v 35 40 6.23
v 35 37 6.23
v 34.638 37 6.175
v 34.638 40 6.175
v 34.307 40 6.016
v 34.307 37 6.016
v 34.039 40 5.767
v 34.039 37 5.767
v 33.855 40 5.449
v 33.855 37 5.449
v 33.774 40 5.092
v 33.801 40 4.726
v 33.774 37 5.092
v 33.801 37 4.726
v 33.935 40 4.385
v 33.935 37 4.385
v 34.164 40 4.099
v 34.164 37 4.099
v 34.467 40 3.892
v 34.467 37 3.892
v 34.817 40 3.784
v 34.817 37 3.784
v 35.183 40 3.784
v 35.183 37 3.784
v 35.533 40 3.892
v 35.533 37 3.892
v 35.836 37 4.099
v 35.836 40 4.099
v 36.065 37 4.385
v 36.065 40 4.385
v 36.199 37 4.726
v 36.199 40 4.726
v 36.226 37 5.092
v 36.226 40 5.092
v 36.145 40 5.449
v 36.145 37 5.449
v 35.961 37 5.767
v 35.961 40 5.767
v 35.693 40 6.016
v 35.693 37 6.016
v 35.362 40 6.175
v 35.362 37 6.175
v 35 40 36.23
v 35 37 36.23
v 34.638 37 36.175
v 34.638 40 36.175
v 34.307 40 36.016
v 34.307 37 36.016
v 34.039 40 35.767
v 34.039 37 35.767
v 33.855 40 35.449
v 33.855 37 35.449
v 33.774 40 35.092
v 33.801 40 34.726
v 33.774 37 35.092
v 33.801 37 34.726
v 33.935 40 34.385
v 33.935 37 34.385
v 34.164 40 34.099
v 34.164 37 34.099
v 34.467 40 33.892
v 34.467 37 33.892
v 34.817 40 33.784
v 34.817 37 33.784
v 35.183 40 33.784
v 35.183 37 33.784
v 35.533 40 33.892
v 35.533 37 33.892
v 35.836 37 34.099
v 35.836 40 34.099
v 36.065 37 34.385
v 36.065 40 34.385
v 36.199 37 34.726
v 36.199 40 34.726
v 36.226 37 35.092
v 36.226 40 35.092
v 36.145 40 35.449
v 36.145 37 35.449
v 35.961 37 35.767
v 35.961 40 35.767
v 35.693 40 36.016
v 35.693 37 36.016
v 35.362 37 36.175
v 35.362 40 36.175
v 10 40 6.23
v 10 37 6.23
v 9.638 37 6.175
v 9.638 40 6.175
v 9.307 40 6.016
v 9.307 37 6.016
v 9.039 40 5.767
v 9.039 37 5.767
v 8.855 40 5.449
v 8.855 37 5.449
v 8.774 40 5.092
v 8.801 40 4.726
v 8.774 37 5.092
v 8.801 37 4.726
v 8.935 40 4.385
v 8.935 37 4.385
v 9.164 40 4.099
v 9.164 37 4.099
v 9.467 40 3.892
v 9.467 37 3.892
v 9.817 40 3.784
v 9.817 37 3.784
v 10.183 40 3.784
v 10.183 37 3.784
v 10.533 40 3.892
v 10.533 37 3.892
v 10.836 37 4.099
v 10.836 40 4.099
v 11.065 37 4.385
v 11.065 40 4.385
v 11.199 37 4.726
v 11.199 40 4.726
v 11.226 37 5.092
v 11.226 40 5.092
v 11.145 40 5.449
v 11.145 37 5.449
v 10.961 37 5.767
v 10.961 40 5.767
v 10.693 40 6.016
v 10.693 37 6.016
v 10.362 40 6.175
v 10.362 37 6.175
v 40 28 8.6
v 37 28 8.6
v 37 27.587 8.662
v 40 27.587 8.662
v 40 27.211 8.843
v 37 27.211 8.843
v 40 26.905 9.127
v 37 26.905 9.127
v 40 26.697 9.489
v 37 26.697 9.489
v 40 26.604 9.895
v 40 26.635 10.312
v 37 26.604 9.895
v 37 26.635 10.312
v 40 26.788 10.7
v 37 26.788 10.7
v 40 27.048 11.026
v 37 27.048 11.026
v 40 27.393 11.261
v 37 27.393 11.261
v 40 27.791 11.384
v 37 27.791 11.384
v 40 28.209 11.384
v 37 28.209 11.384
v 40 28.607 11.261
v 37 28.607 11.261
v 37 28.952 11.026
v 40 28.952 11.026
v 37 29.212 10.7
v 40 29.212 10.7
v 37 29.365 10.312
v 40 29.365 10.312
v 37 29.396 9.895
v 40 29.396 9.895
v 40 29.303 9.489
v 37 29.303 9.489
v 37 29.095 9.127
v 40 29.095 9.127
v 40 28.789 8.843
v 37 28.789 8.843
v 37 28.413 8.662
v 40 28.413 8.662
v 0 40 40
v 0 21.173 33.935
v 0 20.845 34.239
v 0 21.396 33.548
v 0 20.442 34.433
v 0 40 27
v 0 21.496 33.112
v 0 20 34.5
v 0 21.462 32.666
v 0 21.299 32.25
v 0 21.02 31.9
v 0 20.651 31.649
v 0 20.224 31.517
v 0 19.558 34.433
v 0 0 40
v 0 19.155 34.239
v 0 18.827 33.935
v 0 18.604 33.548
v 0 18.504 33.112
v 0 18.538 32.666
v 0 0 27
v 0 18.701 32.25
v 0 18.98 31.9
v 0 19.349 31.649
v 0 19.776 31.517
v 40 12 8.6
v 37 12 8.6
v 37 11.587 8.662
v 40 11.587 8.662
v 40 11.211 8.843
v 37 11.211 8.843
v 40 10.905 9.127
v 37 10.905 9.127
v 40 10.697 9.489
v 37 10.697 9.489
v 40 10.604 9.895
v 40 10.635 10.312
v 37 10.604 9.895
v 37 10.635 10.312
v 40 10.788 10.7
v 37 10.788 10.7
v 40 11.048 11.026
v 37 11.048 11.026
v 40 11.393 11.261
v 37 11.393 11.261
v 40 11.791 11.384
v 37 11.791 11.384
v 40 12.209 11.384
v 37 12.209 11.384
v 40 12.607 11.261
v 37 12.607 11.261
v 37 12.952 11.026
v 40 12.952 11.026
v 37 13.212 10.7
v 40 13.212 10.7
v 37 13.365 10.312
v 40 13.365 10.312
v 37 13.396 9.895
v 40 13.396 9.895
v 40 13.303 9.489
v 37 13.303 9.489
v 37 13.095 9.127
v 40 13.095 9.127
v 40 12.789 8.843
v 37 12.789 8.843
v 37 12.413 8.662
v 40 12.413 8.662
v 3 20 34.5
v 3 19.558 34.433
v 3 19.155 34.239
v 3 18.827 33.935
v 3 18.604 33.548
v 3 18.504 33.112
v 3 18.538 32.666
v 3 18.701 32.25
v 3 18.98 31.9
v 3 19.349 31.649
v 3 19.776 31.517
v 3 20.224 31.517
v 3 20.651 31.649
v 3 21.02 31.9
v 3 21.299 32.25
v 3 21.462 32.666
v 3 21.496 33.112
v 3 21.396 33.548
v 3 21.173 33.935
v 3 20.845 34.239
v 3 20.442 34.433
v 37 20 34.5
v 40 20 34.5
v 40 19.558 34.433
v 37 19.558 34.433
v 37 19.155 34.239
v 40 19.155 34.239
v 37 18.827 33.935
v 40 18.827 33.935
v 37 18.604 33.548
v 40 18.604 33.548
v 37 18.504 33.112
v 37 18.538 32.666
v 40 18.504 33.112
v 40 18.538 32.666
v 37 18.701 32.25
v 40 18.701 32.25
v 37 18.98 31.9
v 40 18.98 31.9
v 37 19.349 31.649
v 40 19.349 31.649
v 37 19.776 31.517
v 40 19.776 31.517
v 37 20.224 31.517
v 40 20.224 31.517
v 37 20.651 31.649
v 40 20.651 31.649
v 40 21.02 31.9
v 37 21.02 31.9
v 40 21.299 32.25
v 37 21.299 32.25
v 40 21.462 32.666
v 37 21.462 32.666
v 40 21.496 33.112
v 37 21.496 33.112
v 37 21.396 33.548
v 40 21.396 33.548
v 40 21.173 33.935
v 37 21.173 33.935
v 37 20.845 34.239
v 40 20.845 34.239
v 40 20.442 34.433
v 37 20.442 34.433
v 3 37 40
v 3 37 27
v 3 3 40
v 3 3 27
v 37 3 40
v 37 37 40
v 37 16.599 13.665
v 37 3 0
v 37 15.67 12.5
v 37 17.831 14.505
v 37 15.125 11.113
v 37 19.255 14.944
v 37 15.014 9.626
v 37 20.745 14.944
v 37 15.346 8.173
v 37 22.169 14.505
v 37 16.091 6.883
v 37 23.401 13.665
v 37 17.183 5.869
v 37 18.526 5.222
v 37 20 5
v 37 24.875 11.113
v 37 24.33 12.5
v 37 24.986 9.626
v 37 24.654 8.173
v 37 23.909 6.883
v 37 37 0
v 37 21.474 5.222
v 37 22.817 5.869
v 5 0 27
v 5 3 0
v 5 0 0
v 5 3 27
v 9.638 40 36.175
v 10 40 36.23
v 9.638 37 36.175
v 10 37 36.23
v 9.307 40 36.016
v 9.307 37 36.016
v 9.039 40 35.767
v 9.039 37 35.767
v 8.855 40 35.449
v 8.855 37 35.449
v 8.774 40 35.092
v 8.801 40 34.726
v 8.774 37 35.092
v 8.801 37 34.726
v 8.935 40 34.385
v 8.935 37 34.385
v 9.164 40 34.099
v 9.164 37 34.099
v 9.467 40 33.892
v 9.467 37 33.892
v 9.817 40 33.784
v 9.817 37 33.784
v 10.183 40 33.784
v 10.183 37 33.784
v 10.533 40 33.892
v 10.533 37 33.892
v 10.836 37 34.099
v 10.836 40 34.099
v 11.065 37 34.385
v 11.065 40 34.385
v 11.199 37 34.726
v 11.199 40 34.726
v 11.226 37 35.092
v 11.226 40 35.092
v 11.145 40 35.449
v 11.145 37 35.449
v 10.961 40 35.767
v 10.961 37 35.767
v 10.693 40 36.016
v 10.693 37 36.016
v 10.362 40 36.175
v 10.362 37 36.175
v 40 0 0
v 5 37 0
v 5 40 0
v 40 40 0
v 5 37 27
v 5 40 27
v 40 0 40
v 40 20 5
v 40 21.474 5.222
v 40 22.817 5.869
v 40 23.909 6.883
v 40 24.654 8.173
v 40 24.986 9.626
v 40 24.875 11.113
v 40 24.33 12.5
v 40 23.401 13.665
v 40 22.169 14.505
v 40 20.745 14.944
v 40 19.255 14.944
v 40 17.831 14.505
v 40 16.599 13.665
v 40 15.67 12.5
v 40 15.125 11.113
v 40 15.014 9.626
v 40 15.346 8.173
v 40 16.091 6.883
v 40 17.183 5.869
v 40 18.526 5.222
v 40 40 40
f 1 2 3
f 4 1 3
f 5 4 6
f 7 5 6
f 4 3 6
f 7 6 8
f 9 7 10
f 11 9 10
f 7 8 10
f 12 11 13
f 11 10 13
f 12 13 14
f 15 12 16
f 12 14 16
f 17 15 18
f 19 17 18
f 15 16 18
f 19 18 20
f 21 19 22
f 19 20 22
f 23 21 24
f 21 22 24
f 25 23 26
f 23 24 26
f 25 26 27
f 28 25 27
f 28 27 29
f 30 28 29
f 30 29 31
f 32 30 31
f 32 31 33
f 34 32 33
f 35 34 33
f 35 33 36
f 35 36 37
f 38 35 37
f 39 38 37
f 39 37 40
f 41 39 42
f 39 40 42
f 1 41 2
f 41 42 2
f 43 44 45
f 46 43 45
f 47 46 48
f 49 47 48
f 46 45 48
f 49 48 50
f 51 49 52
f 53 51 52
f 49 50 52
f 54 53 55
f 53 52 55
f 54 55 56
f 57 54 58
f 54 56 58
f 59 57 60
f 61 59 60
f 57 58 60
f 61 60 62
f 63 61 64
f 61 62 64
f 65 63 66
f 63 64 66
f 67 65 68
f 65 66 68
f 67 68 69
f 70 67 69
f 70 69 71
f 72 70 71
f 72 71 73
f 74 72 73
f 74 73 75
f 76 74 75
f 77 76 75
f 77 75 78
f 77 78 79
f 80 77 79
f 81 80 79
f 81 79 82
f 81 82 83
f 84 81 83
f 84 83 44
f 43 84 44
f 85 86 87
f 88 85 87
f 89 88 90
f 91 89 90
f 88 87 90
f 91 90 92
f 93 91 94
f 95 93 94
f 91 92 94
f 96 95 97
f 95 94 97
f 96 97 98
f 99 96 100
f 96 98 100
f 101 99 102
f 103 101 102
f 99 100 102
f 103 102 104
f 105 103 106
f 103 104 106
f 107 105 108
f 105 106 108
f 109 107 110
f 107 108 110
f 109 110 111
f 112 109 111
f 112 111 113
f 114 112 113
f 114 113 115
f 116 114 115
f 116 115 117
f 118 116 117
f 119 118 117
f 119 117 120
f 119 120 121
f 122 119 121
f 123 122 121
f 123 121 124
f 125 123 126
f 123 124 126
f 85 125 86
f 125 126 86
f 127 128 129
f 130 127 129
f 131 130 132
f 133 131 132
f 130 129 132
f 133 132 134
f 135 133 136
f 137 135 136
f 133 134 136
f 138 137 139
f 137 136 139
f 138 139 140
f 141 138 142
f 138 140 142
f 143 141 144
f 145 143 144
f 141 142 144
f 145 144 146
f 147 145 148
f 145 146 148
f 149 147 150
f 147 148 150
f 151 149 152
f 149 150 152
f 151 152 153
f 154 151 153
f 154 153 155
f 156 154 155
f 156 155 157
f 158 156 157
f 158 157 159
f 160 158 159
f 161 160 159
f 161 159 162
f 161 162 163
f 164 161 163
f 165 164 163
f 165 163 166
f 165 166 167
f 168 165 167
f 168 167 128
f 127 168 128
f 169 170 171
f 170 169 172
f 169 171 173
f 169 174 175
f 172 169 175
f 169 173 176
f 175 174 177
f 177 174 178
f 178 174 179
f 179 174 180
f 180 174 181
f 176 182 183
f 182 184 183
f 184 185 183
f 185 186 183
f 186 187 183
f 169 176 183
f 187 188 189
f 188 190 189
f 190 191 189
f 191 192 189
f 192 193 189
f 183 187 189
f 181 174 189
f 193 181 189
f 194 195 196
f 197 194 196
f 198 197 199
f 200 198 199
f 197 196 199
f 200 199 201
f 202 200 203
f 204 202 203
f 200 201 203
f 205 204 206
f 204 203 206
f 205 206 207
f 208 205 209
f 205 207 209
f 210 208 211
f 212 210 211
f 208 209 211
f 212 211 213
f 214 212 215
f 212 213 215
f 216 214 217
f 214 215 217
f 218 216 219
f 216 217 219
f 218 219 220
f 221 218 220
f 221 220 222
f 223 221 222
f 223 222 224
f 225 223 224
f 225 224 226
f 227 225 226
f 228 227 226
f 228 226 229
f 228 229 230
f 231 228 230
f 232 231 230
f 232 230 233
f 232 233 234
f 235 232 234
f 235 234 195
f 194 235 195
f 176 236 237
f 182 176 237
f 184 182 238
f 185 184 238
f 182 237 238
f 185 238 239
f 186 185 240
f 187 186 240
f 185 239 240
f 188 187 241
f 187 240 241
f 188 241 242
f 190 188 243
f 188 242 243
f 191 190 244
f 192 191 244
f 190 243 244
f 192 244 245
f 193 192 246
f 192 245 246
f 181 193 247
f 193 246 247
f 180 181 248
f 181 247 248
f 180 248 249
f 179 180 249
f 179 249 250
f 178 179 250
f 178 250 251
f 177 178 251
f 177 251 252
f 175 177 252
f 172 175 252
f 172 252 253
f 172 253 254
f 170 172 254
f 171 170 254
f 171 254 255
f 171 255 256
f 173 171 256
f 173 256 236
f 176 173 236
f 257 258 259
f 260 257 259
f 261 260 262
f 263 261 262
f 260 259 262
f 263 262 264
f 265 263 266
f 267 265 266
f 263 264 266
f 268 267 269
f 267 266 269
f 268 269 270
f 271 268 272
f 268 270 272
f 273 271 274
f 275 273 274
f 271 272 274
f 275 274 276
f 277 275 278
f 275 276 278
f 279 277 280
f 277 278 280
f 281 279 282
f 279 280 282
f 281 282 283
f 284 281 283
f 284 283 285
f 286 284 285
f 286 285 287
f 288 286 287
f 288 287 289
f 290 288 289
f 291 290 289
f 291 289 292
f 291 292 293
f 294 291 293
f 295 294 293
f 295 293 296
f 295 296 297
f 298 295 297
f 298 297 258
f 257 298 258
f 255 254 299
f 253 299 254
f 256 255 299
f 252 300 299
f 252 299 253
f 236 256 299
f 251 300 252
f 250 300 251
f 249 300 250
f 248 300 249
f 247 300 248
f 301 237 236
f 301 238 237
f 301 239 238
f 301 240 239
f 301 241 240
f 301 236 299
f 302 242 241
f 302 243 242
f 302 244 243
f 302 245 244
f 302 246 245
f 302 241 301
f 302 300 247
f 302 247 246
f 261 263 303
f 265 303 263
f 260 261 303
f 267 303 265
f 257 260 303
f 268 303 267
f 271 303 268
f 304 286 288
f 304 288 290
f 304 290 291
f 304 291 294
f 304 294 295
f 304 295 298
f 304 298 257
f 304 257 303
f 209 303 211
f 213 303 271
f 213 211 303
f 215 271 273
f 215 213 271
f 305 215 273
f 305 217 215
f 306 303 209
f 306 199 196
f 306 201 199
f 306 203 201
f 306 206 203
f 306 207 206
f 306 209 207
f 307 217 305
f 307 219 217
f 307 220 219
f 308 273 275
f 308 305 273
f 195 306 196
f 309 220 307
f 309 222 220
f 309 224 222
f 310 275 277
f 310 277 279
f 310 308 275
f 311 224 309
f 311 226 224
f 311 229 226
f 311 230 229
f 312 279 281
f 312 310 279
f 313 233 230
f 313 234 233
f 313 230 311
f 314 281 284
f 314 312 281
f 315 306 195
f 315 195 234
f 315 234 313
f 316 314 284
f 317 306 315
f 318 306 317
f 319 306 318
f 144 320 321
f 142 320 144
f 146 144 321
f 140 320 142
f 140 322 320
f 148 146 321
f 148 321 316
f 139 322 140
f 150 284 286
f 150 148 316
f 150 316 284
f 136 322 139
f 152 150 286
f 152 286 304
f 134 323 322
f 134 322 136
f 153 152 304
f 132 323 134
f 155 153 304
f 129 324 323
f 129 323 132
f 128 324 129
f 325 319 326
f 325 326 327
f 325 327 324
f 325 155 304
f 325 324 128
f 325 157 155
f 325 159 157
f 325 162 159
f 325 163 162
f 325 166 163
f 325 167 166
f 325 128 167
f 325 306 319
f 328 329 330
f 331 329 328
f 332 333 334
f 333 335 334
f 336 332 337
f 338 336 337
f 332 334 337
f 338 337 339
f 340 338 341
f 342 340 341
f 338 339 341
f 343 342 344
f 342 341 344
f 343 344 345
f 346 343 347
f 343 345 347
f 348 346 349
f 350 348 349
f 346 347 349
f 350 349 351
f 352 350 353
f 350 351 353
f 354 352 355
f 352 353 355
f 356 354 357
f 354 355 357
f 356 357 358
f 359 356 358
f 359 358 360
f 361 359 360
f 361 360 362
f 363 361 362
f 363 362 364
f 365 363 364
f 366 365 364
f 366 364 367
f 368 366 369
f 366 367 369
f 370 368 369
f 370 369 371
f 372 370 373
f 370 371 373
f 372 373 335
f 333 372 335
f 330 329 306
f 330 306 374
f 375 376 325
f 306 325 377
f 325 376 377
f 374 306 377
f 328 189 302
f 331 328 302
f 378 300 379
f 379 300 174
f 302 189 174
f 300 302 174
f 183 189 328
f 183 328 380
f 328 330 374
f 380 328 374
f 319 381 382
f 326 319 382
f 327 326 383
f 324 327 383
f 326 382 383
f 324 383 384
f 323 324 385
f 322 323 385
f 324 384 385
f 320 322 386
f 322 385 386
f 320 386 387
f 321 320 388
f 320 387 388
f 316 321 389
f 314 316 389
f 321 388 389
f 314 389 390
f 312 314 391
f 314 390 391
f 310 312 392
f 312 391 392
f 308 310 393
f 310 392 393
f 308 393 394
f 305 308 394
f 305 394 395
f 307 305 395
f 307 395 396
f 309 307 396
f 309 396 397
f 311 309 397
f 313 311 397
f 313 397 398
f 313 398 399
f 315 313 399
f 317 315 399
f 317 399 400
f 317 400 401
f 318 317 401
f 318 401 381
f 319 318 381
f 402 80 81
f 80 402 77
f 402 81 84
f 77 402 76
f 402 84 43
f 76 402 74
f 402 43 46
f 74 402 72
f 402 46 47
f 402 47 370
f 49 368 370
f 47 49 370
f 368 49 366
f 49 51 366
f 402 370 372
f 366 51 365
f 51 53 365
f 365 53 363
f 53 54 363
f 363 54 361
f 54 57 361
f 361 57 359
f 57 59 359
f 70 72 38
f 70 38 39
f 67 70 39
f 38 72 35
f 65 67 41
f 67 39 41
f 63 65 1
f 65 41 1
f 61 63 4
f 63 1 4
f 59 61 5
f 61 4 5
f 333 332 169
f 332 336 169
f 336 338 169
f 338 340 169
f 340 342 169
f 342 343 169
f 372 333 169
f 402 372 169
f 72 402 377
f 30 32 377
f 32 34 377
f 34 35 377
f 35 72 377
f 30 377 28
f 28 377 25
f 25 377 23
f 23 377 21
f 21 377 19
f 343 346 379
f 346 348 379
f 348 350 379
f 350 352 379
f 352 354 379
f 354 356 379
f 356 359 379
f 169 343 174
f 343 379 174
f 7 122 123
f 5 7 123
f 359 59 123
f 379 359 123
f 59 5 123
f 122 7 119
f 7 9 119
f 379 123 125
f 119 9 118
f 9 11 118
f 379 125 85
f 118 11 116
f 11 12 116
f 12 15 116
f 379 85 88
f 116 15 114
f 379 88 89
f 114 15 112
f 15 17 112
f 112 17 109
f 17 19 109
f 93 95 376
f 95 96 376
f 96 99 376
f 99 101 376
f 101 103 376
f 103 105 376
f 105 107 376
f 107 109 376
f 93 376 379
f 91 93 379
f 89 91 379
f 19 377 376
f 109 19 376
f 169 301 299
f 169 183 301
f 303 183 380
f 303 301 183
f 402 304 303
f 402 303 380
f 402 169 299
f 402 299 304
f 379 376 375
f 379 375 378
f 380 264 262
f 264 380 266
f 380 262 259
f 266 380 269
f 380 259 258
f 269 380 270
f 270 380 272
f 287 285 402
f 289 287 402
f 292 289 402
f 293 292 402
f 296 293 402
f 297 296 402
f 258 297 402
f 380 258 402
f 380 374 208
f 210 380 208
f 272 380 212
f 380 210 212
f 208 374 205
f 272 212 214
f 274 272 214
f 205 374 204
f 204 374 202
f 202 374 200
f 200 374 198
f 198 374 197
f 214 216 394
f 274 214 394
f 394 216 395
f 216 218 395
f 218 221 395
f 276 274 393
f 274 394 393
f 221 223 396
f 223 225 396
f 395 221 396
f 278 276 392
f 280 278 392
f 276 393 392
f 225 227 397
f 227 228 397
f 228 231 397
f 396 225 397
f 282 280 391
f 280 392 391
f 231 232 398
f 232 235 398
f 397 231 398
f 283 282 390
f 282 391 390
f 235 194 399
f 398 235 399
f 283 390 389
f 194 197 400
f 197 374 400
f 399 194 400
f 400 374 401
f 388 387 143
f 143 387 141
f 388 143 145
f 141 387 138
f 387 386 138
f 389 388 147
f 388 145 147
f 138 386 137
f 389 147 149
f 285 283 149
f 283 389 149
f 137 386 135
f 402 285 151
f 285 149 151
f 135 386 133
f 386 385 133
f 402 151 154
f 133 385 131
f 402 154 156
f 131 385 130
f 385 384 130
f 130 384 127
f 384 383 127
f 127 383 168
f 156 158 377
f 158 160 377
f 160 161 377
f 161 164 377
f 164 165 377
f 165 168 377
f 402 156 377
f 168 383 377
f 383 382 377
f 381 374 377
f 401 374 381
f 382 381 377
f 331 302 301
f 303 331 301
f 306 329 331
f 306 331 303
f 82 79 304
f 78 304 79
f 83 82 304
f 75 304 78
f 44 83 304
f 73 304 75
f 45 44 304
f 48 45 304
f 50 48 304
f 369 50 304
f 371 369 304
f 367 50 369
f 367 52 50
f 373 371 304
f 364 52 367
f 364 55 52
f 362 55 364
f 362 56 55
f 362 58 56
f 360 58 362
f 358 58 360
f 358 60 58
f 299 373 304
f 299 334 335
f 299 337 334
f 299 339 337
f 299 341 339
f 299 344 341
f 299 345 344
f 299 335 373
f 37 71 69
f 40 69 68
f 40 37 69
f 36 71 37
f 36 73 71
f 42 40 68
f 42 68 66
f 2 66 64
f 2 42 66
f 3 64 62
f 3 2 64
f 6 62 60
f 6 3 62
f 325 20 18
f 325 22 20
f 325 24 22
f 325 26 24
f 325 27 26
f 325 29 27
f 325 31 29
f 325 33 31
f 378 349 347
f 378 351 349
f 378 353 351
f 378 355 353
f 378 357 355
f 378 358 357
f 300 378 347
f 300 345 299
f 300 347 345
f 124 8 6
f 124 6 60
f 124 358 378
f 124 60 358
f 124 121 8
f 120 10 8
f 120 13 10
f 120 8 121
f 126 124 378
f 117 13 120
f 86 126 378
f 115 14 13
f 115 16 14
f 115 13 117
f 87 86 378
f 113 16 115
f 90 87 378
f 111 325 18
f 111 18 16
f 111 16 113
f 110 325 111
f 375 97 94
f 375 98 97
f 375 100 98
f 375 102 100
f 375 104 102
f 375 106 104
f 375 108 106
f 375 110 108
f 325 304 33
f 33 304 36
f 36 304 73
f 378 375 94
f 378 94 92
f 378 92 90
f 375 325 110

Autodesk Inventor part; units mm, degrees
ref_plane "YZ Plane" through (0, 0, 0) normal (1, 0, 0) x (0, 1, 0)
ref_plane "XZ Plane" through (0, 0, 0) normal (0, 1, 0) x (-1, 0, 0)
ref_plane "XY Plane" through (0, 0, 0) normal (0, 0, 1) x (1, 0, 0)
sketch "スケッチ1" plane through (0, 0, 0) normal (0, 0, 1) x (1, 0, 0)
  line L0 (0, 0) -> (40, 0)
  line L1 (40, 0) -> (40, 40)
  line L2 (40, 40) -> (0, 40)
  line L3 (0, 40) -> (0, 0)
  dimension "d0" = 40
  dimension "d1" = 40
extrude "押し出し1" add sketch "スケッチ1" along normal blind 40
shell "シェル1" thickness 3 removed faces 2 at (26.6667, 13.3333, 0) at (26.6667, 13.3333, 40)
sketch "スケッチ2" plane through (0, 0, 0) normal (-1, 0, 0) x (0, 0, 1)
  line L0 (0, 40) -> (0, 0) projected
  line L1 (0, 40) -> (40, 40) projected
  line L2 (0, 0) -> (27, 0)
  line L3 (27, 0) -> (27, 40)
  line L4 (27, 40) -> (0, 40)
  line L5 (0, 40) -> (0, 0)
  dimension "d5" = 27
extrude "押し出し2" cut sketch "スケッチ2" against normal blind 5
sketch "スケッチ3" plane through (0, 0, 40) normal (-1, 0, 0) x (0, 0, 1)
  circle A0 centre (-7, 20) radius 1.5
  line L0 (0, 40) -> (0, 0) projected
  line L1 (-13, 0) -> (0, 0) projected
  point P0 (-40, 0)
  dimension "d8" = 3
  dimension "d9" = 7
  dimension "d10" = 20
hole "穴1" at (0, 20, 33) direction (1, 0, 0) diameter 3 end through all
sketch "スケッチ4" plane through (0, 40, 40) normal (0, 1, 0) x (1, 0, 0)
  line L0 (35, 35) -> (10, 35)
  line L1 (10, 35) -> (10, 5)
  line L2 (10, 5) -> (35, 5)
  line L3 (35, 5) -> (35, 35)
  line L4 (40, 40) -> (5, 40) projected
  line L5 (40, 40) -> (40, 0) projected
  point P0 (0, 40)
  dimension "d18" = 25
  dimension "d19" = 30
  dimension "d20" = 5
  dimension "d21" = 5
hole "穴2" at (10, 40, 5) at (35, 40, 5) at (35, 40, 35) at (10, 40, 35) direction (0, -1, 0) diameter 2.459 depth 3 thread size "M3x0.5" class "6H" standard "ISO Metric profile"
sketch "スケッチ5" plane through (40, 0, 0) normal (1, 0, 0) x (0, 0, -1)
  line L0 (0, 0) -> (-40, 0) projected
  line L1 (0, 0) -> (0, 40) projected
  point P0 (-10, 12)
  point P1 (-10, 28)
  dimension "d29" = 16
  dimension "d32" = 12
  dimension "d33" = 10
  dimension "d34" = 10
hole "穴3" at (40, 28, 10) at (40, 12, 10) direction (-1, 0, 0) diameter 2.8 depth 3
sketch "スケッチ6" plane through (40, 0, 0) normal (1, 0, 0) x (0, 0, -1)
  circle A0 centre (-10, 20) radius 5
  line L0 (0, 0) -> (0, 40) projected
  line L1 (0, 0) -> (-40, 0) projected
  dimension "d42" = 10
  dimension "d43" = 10
  dimension "d44" = 20
extrude "押し出し3" cut sketch "スケッチ6" against normal blind 5
properties part number "ギヤボックス２右"
